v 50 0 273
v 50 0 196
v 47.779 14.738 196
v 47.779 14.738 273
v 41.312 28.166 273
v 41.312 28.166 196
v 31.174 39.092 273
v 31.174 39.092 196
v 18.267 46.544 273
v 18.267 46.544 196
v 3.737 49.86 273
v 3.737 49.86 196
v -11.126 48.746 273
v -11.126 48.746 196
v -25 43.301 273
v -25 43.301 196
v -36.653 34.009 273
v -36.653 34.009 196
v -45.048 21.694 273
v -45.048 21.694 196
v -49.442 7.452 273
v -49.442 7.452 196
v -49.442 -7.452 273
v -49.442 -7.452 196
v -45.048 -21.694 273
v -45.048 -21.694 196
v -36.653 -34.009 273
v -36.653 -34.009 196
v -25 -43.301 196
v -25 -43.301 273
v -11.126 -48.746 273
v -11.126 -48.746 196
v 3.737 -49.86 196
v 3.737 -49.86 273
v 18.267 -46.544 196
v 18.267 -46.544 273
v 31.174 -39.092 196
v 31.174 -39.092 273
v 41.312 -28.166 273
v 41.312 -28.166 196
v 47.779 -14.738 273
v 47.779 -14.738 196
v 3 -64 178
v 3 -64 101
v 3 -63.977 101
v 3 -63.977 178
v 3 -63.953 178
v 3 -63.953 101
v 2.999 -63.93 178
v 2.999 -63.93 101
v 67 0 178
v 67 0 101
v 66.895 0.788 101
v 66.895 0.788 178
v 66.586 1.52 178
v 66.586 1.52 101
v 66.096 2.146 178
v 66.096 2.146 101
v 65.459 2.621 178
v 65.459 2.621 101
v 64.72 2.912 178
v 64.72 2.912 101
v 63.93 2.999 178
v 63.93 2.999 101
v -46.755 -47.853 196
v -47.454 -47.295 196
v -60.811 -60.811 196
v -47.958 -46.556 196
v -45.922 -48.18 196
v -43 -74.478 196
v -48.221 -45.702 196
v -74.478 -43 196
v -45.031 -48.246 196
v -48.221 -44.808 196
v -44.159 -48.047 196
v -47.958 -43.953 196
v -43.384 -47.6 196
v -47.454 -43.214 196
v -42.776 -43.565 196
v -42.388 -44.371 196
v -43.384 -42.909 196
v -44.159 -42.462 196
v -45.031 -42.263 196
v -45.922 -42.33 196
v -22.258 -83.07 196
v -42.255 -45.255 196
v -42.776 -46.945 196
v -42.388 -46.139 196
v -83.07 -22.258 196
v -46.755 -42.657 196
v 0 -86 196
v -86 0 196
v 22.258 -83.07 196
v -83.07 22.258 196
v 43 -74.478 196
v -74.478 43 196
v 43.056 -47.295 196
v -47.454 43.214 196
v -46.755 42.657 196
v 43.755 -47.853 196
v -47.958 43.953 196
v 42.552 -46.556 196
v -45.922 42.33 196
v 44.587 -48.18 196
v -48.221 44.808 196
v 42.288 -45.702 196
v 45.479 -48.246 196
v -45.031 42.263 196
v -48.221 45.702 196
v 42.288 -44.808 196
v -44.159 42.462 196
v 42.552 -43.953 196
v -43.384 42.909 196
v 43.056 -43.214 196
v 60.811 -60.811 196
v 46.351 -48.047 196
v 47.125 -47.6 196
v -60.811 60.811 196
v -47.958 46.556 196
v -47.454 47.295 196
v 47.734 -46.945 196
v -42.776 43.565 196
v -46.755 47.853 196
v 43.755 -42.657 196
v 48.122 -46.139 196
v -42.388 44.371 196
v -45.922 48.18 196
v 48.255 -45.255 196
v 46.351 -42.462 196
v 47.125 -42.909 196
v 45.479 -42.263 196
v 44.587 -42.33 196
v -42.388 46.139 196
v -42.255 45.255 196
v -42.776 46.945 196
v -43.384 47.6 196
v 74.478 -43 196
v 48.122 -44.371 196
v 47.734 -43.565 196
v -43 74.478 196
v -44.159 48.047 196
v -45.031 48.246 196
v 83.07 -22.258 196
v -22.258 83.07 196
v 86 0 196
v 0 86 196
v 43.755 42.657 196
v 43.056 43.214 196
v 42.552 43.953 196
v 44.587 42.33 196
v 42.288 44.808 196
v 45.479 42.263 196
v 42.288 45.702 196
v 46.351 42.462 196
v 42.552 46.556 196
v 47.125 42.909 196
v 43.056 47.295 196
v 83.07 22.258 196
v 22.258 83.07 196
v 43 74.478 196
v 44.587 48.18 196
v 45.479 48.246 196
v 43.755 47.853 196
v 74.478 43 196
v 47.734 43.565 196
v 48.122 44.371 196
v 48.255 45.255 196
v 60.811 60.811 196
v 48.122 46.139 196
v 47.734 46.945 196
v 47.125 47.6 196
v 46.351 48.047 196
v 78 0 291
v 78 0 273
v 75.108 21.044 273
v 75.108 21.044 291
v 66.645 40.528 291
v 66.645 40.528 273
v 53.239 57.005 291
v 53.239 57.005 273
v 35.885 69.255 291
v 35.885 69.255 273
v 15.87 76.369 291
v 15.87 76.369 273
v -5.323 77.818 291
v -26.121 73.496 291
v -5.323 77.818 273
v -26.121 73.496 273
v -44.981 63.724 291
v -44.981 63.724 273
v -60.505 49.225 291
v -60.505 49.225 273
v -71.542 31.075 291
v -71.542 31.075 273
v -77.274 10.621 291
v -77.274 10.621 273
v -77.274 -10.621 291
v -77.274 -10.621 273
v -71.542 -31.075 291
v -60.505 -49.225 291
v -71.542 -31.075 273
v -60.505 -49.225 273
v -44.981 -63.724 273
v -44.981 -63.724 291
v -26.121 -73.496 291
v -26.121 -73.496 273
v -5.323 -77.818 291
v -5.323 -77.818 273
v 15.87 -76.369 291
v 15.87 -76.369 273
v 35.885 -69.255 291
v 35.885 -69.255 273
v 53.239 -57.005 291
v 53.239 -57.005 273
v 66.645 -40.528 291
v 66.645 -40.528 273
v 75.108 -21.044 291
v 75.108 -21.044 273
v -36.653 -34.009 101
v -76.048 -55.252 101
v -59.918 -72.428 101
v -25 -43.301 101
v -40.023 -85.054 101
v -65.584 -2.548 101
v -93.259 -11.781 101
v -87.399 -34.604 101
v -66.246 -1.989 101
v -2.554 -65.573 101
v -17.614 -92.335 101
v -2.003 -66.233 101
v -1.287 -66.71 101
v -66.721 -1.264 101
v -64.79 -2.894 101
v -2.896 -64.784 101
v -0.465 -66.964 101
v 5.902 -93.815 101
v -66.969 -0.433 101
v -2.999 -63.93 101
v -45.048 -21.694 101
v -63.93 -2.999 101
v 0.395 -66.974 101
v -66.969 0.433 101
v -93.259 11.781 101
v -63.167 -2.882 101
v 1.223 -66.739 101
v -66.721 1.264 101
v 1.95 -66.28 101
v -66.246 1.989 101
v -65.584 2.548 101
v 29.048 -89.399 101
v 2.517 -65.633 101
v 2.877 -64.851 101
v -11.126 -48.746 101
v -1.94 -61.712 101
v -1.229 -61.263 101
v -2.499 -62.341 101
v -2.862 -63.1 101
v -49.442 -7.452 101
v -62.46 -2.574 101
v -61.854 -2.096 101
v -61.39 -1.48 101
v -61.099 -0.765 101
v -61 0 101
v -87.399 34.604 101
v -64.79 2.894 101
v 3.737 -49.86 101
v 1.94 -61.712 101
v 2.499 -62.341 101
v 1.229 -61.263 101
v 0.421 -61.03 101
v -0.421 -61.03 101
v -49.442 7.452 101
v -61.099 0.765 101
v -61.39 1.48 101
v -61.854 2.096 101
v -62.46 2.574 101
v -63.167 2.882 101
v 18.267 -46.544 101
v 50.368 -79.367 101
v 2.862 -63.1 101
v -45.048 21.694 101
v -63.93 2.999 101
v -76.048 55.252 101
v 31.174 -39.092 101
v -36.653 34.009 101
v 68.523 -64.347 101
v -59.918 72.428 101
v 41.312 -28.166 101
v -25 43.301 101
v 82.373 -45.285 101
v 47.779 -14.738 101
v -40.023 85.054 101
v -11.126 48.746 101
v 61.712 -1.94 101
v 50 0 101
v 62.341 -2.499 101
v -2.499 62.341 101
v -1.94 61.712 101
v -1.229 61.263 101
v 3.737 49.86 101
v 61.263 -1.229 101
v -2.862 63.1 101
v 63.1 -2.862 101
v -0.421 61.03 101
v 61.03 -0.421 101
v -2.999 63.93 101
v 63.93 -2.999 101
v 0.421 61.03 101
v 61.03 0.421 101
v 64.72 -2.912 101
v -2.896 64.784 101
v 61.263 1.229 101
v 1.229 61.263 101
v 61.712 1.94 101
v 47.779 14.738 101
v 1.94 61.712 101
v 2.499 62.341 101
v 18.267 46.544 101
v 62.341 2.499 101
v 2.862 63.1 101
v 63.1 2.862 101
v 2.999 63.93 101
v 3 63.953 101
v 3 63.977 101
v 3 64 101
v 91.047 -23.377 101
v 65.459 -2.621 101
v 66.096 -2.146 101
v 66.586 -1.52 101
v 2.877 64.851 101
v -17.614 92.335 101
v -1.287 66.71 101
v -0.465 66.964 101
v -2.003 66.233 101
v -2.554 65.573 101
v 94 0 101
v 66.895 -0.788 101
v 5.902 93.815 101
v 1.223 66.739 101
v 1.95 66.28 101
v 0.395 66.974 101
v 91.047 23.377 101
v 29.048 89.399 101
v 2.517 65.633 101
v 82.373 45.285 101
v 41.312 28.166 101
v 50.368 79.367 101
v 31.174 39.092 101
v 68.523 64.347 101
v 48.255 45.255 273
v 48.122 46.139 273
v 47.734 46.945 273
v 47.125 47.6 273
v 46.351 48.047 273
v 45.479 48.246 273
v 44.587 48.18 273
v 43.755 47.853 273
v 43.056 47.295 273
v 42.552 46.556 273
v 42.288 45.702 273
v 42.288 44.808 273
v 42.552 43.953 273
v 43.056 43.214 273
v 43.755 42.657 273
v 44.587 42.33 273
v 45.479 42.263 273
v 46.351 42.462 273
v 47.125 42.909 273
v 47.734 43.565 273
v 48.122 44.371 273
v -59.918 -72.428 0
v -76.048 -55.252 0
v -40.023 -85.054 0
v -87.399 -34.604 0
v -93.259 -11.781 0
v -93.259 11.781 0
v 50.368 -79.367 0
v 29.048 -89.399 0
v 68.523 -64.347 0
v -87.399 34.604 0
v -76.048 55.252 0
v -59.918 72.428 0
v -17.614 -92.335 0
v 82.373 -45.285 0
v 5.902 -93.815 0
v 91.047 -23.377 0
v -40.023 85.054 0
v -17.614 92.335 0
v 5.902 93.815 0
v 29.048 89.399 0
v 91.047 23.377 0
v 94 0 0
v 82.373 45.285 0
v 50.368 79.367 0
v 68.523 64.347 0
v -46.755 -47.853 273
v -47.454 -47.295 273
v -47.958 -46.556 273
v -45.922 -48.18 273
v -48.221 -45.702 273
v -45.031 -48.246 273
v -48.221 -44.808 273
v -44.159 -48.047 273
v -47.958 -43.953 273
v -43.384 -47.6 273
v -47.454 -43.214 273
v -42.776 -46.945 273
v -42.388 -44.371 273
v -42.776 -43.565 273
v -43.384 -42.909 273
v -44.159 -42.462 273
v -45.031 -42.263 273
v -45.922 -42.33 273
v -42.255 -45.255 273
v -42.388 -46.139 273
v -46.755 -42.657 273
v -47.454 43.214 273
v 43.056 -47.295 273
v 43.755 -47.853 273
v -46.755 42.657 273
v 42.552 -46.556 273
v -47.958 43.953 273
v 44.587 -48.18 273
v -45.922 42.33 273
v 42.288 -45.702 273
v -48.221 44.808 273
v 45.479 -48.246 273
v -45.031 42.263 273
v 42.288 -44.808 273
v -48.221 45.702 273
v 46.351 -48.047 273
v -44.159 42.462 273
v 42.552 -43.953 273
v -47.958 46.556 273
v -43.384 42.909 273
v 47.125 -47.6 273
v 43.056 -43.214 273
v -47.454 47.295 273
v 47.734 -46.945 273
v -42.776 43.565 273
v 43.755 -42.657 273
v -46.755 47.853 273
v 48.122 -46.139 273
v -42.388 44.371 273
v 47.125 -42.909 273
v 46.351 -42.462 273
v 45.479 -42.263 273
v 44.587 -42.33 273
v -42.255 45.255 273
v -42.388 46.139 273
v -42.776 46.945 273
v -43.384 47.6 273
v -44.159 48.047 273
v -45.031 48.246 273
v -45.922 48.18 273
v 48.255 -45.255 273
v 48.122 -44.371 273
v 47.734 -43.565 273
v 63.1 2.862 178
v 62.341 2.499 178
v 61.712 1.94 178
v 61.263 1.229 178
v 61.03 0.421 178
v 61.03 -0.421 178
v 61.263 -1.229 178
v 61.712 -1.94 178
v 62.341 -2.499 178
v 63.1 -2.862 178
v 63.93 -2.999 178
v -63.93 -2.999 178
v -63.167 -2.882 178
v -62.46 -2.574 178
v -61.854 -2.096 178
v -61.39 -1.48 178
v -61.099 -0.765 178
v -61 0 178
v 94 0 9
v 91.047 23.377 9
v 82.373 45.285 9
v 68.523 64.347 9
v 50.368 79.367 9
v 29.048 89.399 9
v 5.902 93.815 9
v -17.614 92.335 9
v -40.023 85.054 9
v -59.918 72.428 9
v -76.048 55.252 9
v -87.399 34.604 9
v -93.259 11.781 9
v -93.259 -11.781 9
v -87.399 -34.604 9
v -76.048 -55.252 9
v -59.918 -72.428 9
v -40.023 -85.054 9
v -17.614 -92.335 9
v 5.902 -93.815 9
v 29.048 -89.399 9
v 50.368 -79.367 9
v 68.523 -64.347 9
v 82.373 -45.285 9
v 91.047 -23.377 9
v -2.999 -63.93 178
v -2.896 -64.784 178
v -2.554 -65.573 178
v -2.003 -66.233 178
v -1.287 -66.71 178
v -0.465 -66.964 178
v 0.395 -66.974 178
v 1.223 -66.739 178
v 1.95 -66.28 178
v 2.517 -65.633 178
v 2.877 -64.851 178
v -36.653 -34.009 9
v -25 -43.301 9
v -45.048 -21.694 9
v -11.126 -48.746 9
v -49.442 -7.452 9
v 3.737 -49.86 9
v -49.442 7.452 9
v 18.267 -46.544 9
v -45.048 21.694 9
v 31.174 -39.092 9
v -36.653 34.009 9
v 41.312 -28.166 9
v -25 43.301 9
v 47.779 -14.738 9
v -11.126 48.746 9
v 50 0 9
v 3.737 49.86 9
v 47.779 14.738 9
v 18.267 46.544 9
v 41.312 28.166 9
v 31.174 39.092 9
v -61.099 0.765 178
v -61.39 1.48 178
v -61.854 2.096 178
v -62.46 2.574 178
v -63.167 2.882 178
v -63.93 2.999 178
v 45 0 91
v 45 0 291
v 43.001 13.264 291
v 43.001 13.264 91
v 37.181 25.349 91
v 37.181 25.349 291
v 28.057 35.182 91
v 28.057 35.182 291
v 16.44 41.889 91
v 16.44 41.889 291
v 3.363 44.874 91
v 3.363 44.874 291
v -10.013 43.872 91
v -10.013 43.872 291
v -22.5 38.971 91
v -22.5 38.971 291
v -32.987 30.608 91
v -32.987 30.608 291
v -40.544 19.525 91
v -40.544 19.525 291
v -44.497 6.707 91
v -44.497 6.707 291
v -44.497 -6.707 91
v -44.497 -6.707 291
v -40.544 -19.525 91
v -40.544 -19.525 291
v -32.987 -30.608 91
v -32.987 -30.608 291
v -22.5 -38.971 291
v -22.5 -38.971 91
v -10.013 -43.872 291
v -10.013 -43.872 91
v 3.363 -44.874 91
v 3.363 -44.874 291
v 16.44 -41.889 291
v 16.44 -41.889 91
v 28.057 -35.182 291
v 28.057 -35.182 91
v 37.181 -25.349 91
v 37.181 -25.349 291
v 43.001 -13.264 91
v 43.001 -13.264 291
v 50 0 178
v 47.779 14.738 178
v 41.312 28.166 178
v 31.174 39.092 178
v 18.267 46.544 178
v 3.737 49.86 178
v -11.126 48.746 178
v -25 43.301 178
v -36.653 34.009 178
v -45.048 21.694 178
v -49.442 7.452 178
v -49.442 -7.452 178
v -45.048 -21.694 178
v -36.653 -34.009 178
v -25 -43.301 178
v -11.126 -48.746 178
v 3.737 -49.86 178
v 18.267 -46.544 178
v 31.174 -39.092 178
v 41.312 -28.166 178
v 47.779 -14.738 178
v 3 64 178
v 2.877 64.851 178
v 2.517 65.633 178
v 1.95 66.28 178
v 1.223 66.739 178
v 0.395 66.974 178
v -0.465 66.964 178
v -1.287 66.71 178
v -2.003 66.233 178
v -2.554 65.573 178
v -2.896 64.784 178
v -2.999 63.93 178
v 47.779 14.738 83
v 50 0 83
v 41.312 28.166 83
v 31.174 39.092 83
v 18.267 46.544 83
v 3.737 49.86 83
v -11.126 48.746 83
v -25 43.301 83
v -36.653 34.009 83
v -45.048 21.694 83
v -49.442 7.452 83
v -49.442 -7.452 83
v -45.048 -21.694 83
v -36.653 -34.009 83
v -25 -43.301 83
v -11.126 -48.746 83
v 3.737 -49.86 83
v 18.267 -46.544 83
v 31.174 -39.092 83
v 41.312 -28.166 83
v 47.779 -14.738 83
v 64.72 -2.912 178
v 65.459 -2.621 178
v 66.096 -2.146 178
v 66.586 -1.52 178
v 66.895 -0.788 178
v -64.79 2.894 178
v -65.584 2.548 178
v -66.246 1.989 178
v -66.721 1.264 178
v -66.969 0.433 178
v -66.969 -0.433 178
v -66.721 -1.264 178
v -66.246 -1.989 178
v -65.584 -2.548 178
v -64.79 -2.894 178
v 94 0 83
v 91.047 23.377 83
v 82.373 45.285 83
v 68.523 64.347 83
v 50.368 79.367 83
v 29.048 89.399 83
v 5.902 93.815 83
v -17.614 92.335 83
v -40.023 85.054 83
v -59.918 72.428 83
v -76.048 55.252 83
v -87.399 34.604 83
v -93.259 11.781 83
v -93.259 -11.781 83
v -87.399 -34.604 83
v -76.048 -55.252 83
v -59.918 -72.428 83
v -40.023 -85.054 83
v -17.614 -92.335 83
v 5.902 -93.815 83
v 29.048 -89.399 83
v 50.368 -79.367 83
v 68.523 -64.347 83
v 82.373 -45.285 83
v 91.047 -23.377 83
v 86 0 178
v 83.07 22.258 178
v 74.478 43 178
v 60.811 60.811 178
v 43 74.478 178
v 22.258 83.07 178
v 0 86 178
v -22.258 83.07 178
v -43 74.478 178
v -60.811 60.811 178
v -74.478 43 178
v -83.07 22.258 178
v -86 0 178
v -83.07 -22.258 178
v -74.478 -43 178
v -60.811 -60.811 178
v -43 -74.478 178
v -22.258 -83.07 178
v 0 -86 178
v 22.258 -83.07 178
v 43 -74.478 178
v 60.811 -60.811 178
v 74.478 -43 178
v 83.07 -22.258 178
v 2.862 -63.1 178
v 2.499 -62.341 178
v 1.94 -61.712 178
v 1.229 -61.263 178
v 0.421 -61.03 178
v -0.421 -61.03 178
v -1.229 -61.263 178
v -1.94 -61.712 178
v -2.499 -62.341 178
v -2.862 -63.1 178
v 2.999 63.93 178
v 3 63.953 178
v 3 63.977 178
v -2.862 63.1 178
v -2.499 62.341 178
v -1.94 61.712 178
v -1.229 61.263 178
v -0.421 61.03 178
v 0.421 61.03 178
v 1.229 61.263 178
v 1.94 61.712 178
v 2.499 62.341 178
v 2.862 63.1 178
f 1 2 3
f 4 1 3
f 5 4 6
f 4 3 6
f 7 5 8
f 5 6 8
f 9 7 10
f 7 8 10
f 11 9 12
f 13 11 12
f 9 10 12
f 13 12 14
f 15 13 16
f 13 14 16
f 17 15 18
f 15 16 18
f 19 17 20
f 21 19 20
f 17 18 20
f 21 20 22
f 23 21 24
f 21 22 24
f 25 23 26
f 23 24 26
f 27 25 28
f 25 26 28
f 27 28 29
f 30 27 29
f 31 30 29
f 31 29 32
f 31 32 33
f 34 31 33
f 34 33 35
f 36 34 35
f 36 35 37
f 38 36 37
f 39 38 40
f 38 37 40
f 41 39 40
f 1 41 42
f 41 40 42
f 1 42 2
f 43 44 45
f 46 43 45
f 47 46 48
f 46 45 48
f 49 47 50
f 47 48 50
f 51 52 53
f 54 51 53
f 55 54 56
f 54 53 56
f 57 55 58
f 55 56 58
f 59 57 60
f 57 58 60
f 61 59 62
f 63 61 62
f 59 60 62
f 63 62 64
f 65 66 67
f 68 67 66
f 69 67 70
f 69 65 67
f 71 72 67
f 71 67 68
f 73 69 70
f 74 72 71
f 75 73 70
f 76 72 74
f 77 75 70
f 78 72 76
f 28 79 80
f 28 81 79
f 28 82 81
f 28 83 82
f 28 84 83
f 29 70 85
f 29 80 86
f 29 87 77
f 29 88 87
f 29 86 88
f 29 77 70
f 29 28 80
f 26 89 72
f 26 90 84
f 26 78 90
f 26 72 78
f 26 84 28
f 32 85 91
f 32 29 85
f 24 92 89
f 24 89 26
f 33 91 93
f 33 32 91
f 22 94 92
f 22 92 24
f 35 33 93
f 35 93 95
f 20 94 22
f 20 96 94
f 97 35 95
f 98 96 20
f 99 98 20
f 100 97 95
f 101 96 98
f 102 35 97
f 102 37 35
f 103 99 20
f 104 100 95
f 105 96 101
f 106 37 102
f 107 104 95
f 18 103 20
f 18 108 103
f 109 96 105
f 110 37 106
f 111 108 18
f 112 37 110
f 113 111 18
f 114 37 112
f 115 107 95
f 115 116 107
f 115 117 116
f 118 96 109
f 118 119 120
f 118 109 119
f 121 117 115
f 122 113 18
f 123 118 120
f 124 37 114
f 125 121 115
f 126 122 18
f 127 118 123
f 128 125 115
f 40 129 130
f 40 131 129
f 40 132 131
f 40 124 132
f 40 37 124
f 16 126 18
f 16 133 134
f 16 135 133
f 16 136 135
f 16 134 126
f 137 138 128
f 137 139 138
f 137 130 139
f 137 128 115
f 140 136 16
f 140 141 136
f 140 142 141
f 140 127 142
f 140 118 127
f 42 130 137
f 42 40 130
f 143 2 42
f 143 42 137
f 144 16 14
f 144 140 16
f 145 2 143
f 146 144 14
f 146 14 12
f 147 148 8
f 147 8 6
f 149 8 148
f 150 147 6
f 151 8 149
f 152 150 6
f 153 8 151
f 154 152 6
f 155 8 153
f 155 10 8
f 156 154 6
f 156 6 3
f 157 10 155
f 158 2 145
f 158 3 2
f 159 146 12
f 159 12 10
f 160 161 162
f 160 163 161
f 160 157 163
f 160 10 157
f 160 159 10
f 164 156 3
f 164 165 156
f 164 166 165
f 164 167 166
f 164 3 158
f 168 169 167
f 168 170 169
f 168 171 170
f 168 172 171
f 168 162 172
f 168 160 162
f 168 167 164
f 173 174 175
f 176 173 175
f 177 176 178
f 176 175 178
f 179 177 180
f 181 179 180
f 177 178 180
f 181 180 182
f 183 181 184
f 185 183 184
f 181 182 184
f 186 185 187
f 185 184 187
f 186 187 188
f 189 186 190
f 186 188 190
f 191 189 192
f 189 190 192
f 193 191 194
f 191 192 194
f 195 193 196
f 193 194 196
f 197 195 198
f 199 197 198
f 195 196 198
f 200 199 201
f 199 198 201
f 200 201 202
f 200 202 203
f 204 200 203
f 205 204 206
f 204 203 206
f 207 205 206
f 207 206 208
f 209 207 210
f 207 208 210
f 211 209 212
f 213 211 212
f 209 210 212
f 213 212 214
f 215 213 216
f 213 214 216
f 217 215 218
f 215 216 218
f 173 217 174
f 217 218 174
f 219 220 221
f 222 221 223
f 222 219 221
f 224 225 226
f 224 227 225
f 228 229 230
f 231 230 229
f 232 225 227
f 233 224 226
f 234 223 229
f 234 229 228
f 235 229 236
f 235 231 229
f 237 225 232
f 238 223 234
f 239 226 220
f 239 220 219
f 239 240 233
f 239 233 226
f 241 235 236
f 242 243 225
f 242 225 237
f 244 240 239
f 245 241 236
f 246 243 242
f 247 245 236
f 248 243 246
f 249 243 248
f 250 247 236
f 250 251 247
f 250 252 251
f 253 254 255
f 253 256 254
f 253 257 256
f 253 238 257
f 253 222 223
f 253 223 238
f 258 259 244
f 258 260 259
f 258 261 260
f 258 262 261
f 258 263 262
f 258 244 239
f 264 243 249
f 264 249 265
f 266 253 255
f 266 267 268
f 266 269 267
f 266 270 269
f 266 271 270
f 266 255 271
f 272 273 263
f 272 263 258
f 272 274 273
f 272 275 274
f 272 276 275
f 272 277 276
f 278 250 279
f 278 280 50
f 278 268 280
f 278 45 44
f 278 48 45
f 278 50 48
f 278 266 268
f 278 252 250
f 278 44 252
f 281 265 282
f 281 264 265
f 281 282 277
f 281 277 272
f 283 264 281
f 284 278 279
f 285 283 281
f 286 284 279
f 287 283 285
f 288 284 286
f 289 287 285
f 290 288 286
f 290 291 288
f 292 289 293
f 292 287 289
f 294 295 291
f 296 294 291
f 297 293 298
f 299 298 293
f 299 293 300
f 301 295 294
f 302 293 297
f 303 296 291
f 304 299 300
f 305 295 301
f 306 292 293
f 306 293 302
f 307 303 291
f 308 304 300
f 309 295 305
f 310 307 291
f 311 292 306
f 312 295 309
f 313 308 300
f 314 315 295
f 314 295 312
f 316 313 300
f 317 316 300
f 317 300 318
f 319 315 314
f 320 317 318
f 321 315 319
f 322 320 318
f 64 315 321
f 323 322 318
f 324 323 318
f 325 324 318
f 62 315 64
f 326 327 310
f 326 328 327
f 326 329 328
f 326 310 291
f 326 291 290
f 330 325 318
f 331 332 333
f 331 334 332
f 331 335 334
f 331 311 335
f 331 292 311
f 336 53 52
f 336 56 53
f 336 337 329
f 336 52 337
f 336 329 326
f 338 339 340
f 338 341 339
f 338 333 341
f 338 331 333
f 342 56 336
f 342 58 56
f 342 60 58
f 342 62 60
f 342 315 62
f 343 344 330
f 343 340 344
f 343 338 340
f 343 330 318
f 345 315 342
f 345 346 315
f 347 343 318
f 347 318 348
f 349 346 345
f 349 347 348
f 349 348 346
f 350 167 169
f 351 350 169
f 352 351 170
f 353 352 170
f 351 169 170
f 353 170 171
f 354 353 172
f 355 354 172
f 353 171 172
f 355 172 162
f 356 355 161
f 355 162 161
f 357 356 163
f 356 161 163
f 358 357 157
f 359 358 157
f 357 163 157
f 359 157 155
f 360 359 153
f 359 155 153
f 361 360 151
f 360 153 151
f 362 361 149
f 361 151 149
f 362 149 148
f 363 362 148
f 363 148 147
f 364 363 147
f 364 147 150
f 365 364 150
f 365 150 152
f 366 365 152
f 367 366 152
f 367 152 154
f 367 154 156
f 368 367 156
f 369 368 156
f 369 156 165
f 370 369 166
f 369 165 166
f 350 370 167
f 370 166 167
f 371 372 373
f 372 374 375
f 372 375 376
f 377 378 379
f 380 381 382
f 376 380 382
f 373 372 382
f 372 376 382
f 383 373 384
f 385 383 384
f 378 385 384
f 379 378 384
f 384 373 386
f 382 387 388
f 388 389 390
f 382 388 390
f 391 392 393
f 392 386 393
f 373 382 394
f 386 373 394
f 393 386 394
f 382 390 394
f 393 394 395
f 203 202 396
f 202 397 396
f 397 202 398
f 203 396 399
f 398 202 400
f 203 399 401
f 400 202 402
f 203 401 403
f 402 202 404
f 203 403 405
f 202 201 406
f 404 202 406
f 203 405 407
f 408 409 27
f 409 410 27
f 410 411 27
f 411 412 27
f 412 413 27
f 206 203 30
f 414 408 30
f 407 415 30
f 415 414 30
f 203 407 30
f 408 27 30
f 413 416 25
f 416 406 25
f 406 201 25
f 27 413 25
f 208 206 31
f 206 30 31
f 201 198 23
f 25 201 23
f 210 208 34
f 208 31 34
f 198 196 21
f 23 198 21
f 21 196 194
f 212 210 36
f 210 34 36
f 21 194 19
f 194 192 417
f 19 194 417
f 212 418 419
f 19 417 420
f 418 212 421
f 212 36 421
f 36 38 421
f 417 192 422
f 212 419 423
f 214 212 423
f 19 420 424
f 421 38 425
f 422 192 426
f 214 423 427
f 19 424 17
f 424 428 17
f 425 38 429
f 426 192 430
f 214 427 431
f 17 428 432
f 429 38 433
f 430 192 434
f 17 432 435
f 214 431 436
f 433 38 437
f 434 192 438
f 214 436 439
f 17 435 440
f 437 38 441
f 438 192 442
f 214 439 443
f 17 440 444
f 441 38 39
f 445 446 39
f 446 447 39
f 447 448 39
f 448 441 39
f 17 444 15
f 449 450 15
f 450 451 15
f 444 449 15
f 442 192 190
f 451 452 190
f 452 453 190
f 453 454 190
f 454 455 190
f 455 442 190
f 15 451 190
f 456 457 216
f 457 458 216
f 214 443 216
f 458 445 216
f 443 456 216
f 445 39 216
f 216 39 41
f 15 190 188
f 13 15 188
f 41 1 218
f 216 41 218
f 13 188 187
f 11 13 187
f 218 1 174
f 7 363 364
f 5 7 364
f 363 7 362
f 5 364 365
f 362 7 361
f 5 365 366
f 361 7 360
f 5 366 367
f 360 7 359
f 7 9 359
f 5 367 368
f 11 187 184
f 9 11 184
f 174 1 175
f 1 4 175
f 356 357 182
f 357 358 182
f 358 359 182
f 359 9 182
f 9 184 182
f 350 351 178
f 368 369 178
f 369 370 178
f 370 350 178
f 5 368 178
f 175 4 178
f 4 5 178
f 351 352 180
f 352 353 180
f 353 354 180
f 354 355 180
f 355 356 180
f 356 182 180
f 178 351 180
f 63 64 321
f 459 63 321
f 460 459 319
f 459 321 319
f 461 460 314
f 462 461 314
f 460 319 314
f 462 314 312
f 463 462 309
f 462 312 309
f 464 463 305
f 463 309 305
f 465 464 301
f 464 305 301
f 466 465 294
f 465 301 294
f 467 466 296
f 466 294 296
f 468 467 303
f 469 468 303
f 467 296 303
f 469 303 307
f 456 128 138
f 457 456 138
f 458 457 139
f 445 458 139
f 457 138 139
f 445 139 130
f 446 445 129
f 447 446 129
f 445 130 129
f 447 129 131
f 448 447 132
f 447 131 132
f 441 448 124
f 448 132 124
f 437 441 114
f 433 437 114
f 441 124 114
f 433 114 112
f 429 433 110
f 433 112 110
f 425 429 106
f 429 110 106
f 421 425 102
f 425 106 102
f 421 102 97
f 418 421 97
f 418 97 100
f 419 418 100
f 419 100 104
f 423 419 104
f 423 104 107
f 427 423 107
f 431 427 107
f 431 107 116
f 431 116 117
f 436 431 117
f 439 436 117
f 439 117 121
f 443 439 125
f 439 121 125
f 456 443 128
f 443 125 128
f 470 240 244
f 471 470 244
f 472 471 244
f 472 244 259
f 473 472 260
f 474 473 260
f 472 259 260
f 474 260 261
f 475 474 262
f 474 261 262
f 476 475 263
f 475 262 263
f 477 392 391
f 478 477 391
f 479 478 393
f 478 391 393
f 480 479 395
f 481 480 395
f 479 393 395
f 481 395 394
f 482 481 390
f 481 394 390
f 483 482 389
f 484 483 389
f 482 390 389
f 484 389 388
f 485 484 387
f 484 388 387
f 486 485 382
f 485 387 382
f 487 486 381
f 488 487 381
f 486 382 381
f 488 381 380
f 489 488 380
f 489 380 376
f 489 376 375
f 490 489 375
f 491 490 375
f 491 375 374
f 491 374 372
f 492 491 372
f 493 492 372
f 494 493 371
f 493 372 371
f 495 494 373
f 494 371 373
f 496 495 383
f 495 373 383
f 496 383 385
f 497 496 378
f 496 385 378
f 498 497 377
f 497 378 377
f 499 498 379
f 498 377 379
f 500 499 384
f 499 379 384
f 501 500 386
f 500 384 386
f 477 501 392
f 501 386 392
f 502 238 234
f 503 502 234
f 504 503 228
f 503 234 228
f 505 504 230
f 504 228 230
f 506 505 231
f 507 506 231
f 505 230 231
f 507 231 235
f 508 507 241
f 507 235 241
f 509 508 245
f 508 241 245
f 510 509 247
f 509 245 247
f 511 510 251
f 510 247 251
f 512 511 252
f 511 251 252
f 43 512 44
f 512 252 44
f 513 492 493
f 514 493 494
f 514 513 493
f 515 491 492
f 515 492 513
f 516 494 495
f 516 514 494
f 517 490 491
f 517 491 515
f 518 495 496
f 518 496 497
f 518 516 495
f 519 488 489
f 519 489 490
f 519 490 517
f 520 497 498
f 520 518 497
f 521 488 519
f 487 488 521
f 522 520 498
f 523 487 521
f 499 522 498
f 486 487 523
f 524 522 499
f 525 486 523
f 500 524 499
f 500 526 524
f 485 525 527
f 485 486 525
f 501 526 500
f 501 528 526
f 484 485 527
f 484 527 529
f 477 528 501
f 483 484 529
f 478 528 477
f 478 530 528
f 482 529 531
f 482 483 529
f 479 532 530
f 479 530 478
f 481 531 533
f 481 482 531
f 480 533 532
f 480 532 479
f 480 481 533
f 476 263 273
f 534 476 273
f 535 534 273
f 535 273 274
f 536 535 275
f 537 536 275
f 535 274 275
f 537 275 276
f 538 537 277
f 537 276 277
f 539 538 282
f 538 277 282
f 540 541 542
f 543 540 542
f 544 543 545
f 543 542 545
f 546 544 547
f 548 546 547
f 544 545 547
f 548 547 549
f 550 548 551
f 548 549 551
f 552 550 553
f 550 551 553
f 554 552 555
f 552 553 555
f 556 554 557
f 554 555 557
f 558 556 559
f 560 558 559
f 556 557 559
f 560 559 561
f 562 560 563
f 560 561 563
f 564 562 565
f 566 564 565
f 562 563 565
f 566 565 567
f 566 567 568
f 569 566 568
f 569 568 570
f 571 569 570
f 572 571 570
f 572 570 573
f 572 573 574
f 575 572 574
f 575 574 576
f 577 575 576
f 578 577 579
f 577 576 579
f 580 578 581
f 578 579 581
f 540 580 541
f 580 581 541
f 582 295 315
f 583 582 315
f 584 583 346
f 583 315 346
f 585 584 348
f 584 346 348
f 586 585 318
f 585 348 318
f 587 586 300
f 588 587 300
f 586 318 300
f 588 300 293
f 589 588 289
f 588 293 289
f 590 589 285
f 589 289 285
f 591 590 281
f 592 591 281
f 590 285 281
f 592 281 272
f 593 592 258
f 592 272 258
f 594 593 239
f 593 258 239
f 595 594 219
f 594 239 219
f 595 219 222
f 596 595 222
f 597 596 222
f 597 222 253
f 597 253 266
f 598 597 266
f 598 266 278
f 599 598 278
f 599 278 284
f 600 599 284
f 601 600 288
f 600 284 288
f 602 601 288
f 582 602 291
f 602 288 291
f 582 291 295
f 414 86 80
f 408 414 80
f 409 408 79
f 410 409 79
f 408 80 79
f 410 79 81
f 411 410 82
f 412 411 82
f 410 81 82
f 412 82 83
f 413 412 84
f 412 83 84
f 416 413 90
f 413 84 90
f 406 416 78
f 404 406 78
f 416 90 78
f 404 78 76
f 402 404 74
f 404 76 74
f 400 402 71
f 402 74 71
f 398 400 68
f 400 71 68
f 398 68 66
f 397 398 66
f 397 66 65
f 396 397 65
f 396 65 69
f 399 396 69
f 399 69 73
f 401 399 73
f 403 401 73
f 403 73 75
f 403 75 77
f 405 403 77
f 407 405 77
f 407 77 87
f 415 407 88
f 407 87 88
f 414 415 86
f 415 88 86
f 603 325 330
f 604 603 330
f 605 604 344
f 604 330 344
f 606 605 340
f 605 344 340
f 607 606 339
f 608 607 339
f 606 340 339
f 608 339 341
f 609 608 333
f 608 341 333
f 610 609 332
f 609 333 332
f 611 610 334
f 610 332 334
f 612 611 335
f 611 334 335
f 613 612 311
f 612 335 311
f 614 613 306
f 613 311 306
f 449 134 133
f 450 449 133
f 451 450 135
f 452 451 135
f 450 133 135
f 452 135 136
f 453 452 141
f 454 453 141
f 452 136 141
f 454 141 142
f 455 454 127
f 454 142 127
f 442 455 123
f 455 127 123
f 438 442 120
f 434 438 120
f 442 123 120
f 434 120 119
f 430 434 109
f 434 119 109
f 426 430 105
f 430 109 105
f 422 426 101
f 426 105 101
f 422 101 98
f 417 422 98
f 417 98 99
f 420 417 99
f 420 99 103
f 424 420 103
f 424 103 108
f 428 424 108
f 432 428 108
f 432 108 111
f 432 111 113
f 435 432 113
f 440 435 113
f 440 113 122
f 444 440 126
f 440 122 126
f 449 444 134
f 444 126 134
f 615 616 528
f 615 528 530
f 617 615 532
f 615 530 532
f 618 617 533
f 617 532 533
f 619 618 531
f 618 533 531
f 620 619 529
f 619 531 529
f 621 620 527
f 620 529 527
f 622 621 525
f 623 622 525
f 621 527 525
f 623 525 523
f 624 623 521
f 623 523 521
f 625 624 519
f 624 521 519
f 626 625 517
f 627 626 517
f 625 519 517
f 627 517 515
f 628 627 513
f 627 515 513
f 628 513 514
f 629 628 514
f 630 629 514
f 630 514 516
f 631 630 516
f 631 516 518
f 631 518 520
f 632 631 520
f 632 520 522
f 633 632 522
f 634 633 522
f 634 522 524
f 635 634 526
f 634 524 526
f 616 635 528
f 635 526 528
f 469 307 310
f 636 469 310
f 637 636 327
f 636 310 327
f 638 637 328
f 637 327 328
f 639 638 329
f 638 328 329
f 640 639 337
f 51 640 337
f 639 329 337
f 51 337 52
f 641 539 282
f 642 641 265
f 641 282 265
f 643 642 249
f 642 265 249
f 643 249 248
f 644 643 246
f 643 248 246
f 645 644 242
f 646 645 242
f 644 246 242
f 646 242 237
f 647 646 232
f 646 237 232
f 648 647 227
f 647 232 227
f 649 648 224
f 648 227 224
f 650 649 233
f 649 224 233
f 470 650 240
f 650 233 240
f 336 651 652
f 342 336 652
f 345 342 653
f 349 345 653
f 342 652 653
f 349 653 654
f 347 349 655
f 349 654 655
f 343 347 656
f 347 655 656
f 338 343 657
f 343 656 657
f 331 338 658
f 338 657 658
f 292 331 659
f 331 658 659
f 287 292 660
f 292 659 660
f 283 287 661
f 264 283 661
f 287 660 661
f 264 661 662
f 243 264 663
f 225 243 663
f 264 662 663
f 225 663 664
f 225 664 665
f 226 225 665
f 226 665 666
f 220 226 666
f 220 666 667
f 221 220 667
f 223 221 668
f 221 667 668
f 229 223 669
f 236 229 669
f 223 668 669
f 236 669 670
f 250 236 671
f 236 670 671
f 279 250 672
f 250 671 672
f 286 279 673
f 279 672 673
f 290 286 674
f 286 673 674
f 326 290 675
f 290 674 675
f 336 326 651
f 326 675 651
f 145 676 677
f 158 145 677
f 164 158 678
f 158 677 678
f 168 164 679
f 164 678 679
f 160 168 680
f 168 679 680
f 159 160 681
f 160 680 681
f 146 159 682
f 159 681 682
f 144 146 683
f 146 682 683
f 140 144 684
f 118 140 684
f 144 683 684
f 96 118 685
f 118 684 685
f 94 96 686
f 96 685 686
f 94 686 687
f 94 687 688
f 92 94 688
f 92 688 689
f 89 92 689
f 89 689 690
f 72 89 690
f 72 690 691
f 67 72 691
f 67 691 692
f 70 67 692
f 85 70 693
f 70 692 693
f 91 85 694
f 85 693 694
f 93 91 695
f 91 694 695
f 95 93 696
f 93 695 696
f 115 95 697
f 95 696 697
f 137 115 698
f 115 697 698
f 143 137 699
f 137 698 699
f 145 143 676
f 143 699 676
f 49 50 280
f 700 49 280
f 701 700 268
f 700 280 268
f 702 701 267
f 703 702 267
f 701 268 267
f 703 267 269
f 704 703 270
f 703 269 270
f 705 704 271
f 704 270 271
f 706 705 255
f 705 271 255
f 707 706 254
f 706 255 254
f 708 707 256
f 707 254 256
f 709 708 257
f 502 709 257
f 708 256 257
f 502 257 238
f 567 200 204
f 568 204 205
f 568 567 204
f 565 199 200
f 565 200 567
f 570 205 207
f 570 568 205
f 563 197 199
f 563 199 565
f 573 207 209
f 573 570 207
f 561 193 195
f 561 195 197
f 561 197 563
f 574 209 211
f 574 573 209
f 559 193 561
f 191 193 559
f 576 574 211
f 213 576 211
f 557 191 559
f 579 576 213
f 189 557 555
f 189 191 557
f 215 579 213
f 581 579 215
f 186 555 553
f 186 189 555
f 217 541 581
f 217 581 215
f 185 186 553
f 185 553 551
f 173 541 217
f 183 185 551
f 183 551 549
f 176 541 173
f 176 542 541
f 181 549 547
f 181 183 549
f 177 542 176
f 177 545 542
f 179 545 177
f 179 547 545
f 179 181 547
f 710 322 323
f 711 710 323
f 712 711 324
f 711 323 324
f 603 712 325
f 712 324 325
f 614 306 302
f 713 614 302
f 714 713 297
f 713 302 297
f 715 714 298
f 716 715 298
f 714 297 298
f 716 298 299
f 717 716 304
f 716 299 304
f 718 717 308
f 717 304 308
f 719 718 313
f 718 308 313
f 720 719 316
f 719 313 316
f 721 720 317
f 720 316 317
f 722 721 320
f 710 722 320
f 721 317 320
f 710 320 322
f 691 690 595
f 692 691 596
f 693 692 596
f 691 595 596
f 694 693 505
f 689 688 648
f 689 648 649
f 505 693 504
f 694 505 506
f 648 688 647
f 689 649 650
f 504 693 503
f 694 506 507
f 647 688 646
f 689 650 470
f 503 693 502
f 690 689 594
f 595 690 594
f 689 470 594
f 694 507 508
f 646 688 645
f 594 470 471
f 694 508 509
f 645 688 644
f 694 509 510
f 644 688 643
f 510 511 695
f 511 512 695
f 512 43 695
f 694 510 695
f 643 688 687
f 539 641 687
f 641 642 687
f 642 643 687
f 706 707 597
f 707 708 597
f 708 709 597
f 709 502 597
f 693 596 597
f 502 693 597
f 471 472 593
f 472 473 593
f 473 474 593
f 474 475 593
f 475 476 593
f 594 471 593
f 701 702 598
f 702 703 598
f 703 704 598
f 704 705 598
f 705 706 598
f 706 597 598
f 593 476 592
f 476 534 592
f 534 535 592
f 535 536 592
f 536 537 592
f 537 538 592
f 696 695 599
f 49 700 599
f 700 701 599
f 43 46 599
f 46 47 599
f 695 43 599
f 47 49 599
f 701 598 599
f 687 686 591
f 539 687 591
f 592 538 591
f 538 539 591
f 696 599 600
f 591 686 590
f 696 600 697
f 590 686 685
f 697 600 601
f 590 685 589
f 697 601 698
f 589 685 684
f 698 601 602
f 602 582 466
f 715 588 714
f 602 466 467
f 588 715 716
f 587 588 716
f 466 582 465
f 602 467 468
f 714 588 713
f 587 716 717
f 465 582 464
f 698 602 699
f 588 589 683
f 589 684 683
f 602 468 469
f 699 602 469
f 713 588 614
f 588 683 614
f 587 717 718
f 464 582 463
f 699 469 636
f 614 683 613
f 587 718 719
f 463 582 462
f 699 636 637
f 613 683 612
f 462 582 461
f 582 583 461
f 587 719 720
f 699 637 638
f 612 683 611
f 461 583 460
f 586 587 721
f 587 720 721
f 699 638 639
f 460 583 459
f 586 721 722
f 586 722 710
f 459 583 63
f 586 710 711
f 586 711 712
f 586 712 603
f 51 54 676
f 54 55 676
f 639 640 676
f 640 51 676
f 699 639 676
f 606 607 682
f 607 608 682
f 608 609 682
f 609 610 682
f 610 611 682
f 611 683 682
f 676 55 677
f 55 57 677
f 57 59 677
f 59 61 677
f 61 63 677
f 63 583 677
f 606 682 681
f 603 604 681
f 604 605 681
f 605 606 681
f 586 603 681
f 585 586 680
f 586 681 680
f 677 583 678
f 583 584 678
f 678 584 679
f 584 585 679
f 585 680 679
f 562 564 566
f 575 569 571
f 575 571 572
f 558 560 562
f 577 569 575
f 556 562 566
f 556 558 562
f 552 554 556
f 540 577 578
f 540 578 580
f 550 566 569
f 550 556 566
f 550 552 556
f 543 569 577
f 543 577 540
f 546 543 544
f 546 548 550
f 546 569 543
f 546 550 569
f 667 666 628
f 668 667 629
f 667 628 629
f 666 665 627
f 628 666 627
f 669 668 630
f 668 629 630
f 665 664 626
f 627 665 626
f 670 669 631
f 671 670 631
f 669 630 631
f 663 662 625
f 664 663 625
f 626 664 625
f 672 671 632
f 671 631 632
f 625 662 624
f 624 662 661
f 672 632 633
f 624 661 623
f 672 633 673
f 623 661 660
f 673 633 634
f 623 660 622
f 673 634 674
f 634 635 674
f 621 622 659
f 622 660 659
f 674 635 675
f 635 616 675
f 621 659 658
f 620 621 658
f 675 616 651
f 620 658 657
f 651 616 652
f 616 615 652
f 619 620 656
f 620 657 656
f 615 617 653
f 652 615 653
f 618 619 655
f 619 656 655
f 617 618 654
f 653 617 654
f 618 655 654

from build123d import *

# Parameters (mm, degrees)
F0_R      = 94
F1_DEPTH  = 9
F2_R      = 50
F3_DEPTH  = 74
F4_R      = 94
F5_DEPTH  = 18
F7_DEPTH  = 77
F8_R      = 50
F9_DEPTH  = 77
F10_R     = 86
F11_DEPTH = 18
F12_R     = 3
F13_DEPTH = 77
F14_R     = 50
F15_DEPTH = 77
F16_R     = 78
F17_DEPTH = 18
F18_R     = 45
F19_DEPTH = 200


with BuildPart() as f1:
    # F0 (on Top) → F1 (new body)
    with BuildSketch(Plane.XY):
        Circle(F0_R)
    extrude(amount=F1_DEPTH)

    # F2 (on face) → F3 (join)
    with BuildSketch(Plane.XY.offset(9)):
        Circle(F2_R)
    extrude(amount=F3_DEPTH)

    # F4 (on face) → F5 (join)
    with BuildSketch(Plane.XY.offset(83)):
        Circle(F4_R)
    extrude(amount=F5_DEPTH)

    # F6 (on face) → F7 (join)
    with BuildSketch(Plane.XY.offset(101)):
        with BuildLine():
            ThreePointArc((-2.9991759122, 63.9296875), (0, 61), (2.9991759122, 63.9296875))
            ThreePointArc((2.9991759122, 63.9296875), (0, 64), (-2.9991759122, 63.9296875))
        make_face()
        with BuildLine():
            ThreePointArc((-2.9991759122, 63.9296875), (0, 64), (2.9991759122, 63.9296875))
            ThreePointArc((2.9991759122, 63.9296875), (2.999793971, 63.9648413354), (3, 64))
            ThreePointArc((3, 64), (-0.0351586646, 66.999793971), (-2.9991759122, 63.9296875))
        make_face()
        with BuildLine():
            ThreePointArc((-63.9296875, -2.9991759122), (-64, 0), (-63.9296875, 2.9991759122))
            ThreePointArc((-63.9296875, 2.9991759122), (-67, 0), (-63.9296875, -2.9991759122))
        make_face()
        with BuildLine():
            ThreePointArc((-61, 0), (-61.8539644108, 2.0963137289), (-63.9296875, 2.9991759122))
            ThreePointArc((-63.9296875, 2.9991759122), (-64, 0), (-63.9296875, -2.9991759122))
            ThreePointArc((-63.9296875, -2.9991759122), (-61.8539644108, -2.0963137289), (-61, 0))
        make_face()
        with BuildLine():
            ThreePointArc((-2.9991759122, -63.9296875), (0, -64), (2.9991759122, -63.9296875))
            ThreePointArc((2.9991759122, -63.9296875), (0, -61), (-2.9991759122, -63.9296875))
        make_face()
        with BuildLine():
            ThreePointArc((3, -64), (2.999793971, -63.9648413354), (2.9991759122, -63.9296875))
            ThreePointArc((2.9991759122, -63.9296875), (0, -64), (-2.9991759122, -63.9296875))
            ThreePointArc((-2.9991759122, -63.9296875), (-0.0351586646, -66.999793971), (3, -64))
        make_face()
        with BuildLine():
            ThreePointArc((63.9296875, -2.9991759122), (63.9824194603, -1.5), (64, 0))
            ThreePointArc((64, 0), (63.9824194603, 1.5), (63.9296875, 2.9991759122))
            ThreePointArc((63.9296875, 2.9991759122), (61, 0), (63.9296875, -2.9991759122))
        make_face()
        with BuildLine():
            ThreePointArc((63.9296875, 2.9991759122), (63.9824194603, 1.5), (64, 0))
            ThreePointArc((64, 0), (63.9824194603, -1.5), (63.9296875, -2.9991759122))
            ThreePointArc((63.9296875, -2.9991759122), (66.0963137289, -2.1460355892), (67, 0))
            ThreePointArc((67, 0), (66.0963137289, 2.1460355892), (63.9296875, 2.9991759122))
        make_face()
    extrude(amount=F7_DEPTH)

    # F8 (on face) → F9 (join)
    with BuildSketch(Plane.XY.offset(101)):
        Circle(F8_R)
    extrude(amount=F9_DEPTH)

    # F10 (on face) → F11 (join)
    with BuildSketch(Plane.XY.offset(178)):
        Circle(F10_R)
    extrude(amount=F11_DEPTH)

    # F12 (on face) → F13 (join)
    with BuildSketch(Plane.XY.offset(196)):
        with Locations((-45.2548339959, 45.2548339959)):
            Circle(F12_R)
        with Locations((45.2548339959, 45.2548339959)):
            Circle(F12_R)
        with Locations((45.2548339959, -45.2548339959)):
            Circle(F12_R)
        with Locations((-45.2548339959, -45.2548339959)):
            Circle(F12_R)
    extrude(amount=F13_DEPTH)

    # F14 (on face) → F15 (join)
    with BuildSketch(Plane.XY.offset(196)):
        Circle(F14_R)
    extrude(amount=F15_DEPTH)

    # F16 (on face) → F17 (join)
    with BuildSketch(Plane.XY.offset(273)):
        Circle(F16_R)
    extrude(amount=F17_DEPTH)

    # F18 (on face) → F19 (cut)
    with BuildSketch(Plane.XY.offset(291)):
        Circle(F18_R)
    extrude(amount=-F19_DEPTH, mode=Mode.SUBTRACT)


solid = f1.part
